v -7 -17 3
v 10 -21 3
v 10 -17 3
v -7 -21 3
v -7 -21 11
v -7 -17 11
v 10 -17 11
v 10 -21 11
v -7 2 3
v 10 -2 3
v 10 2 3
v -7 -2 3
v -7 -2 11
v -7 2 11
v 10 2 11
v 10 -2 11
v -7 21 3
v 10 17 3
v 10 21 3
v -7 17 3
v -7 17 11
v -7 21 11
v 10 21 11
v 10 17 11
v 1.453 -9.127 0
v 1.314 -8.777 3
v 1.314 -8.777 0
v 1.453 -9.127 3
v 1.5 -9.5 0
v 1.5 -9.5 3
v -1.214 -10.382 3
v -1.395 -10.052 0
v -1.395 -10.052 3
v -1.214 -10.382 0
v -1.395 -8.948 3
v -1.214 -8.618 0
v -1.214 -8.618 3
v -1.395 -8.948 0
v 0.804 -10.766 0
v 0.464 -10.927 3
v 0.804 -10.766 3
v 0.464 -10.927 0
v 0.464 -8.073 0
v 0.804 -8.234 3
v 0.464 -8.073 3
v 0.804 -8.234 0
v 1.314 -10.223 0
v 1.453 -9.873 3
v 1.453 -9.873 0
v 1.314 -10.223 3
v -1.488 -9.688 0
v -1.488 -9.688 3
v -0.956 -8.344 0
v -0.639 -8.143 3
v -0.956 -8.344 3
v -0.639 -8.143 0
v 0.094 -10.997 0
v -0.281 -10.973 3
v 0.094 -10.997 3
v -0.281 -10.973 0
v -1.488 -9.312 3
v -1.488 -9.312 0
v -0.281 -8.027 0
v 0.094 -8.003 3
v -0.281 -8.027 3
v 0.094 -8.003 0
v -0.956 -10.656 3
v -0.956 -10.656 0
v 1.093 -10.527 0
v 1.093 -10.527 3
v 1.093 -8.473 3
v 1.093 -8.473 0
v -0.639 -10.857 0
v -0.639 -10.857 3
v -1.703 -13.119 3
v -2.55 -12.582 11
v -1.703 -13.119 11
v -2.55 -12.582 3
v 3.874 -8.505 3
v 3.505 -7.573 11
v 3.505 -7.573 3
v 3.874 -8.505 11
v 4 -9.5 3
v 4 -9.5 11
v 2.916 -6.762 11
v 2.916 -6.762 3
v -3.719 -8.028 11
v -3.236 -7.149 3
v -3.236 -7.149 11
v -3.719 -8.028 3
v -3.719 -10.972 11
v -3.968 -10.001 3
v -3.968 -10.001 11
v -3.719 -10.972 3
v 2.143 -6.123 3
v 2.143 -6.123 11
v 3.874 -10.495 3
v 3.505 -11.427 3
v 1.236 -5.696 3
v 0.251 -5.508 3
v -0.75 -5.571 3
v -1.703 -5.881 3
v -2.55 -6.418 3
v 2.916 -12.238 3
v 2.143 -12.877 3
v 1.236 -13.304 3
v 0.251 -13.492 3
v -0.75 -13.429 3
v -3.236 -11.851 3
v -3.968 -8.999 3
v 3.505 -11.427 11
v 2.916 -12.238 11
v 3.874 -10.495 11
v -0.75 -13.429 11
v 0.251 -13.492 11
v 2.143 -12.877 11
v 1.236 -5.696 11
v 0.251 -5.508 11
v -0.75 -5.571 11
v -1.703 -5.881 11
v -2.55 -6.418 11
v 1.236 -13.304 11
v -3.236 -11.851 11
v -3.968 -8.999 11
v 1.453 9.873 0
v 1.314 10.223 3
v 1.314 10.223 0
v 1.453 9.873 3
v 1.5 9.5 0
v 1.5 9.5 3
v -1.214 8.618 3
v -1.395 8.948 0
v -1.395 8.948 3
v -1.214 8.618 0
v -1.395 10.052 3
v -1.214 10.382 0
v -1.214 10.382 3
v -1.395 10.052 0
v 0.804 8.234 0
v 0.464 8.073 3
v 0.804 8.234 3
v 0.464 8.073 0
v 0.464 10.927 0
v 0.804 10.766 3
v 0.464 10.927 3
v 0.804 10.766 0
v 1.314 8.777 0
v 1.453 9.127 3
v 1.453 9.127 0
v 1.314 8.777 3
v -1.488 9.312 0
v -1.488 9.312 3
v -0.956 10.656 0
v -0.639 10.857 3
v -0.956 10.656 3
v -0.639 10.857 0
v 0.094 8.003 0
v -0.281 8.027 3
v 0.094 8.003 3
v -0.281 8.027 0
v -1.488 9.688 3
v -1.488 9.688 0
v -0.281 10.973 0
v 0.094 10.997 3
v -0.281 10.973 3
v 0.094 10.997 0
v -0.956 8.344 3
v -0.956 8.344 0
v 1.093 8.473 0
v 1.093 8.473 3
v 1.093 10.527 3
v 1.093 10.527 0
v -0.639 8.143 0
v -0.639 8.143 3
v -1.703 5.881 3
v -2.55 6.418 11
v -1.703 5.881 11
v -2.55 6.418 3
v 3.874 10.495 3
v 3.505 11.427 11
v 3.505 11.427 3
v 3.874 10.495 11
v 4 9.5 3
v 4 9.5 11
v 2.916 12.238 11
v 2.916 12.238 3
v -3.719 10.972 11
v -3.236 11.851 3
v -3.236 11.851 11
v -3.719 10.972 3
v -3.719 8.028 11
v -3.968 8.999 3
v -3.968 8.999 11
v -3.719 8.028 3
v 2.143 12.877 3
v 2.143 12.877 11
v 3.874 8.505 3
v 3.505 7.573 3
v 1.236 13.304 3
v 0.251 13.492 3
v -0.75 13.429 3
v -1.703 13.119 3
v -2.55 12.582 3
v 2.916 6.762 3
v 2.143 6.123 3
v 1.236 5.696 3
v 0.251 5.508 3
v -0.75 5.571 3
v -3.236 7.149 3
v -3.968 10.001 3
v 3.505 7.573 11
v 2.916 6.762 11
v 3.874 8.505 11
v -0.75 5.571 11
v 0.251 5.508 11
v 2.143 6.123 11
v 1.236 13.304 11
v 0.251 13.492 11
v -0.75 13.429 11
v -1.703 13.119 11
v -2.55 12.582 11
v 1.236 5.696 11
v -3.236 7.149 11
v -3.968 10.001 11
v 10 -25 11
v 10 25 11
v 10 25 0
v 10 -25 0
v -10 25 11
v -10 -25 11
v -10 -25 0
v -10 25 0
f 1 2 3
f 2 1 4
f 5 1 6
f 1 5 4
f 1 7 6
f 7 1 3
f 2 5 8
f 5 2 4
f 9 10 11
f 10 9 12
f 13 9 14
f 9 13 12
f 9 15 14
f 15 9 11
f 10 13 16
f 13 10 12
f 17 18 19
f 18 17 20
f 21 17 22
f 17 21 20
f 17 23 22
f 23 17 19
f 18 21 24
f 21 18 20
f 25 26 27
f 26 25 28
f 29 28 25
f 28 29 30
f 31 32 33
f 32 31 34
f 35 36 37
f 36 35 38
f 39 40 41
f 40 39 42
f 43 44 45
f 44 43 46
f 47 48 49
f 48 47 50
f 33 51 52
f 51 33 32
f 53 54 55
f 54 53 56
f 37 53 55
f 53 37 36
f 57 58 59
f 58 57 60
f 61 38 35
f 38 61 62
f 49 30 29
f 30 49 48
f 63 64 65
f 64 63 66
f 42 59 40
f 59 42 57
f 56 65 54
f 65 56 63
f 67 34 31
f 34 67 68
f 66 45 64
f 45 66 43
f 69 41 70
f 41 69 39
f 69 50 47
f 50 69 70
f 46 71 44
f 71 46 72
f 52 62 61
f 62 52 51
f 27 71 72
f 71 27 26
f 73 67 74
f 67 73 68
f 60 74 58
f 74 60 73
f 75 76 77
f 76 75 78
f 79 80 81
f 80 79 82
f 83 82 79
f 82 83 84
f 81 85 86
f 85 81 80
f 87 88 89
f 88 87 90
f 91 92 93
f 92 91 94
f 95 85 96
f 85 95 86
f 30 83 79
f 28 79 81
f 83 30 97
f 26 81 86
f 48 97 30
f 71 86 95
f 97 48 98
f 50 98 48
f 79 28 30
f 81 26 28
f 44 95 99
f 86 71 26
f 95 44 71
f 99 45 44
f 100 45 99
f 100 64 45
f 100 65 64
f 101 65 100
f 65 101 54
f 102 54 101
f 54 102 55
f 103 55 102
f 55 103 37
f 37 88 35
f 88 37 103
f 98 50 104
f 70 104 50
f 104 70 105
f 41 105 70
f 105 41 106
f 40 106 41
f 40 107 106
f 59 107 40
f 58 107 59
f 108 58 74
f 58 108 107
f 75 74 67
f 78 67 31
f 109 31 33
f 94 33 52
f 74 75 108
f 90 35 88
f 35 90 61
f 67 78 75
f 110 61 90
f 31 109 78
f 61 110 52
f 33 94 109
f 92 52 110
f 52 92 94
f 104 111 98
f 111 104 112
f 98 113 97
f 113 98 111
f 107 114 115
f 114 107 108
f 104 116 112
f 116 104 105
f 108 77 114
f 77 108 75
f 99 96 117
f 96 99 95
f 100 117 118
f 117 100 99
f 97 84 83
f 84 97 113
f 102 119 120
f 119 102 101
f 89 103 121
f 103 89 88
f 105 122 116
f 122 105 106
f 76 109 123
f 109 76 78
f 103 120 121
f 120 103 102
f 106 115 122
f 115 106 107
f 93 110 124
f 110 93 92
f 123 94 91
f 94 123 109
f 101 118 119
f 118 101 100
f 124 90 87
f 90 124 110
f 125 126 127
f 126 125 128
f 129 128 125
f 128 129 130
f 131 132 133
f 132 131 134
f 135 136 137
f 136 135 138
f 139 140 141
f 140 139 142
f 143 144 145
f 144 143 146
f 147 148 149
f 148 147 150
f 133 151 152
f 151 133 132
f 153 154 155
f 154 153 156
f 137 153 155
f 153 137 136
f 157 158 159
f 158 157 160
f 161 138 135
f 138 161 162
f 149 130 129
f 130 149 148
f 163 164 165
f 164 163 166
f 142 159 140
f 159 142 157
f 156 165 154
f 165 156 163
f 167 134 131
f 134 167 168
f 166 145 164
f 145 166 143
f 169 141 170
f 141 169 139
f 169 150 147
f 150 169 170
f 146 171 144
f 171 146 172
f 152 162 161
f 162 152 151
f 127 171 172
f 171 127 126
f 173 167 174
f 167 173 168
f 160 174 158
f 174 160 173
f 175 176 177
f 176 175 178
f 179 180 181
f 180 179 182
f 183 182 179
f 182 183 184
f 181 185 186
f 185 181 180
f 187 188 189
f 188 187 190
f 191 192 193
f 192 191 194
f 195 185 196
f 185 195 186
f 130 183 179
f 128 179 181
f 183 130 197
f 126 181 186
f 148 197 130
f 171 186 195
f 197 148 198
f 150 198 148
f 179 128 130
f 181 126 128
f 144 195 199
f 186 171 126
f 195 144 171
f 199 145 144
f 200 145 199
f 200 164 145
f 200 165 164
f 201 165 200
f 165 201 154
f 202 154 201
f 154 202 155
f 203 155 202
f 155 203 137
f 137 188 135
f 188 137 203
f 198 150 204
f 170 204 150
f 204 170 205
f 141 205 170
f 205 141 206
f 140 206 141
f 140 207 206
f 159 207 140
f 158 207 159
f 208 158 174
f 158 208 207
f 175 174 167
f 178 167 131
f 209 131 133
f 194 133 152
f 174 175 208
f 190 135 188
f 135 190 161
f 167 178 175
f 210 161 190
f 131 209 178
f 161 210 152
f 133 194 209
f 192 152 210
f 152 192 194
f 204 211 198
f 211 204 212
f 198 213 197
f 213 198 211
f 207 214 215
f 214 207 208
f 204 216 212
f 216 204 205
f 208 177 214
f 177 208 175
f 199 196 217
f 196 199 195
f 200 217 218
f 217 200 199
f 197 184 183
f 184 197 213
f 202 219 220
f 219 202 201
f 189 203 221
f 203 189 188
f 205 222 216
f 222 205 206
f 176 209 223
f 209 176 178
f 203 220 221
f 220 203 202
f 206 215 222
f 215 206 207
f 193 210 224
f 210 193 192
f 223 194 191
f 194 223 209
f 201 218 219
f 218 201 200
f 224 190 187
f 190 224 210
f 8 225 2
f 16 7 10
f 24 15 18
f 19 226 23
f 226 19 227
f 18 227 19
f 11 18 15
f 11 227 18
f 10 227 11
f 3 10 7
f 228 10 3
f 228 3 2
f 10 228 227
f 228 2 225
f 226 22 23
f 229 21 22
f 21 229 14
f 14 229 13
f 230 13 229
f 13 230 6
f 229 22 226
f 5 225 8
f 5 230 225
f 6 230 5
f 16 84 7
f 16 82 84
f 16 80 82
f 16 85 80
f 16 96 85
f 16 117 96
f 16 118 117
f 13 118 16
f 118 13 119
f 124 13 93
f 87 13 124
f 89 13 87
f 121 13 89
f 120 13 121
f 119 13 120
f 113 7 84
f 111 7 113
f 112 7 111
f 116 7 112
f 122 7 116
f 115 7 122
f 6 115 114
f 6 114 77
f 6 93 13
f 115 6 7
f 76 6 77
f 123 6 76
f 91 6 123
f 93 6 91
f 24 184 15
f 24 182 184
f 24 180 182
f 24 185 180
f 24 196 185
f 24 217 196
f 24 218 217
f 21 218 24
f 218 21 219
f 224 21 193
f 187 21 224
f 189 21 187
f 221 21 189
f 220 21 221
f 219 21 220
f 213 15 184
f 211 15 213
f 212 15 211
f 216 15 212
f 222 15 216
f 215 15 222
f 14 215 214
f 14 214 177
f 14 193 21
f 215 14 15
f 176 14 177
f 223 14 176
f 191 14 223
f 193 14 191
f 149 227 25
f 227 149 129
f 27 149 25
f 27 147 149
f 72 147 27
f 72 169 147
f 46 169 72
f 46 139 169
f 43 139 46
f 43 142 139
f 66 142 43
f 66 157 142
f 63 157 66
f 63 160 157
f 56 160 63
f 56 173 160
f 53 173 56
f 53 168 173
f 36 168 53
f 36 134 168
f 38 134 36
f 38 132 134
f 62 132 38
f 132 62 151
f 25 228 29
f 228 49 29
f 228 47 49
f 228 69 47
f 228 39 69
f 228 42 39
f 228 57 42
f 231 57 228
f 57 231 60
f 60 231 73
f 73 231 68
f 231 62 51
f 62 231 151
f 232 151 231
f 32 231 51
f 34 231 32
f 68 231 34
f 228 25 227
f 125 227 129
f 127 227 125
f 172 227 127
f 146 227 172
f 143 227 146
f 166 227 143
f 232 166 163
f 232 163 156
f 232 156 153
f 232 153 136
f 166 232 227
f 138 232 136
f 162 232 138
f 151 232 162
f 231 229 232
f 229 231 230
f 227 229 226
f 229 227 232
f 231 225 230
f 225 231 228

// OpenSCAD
// Print bed glass holder
// (c) 2017 Michael Neuendorf <michael@neuendorf-online.de>

// The gap size in mm. Glass thickness plus convinient space
gap_size = 4;
// The space between slots in mm
void = 15;
// The number of slots
slot_count = 3;

// The width in mm
width = 20;

// Whether screw mounts should applied
screw_mounts = 1; // [0:No, 1:Yes]

/*[Hidden]*/
bottom_thickness = 3;
screw_dia = 3;
screw_driver_dia = 8;

height = gap_size * 2 + bottom_thickness;
length = (slot_count - 1) * void + (slot_count + 2) * gap_size;


holder();

module holder() {
    translate([-width / 2, -length / 2, 0])
    union() {
        difference() {
            cube([width, length, height]);
            
            for (y = [gap_size:void+gap_size:gap_size + (slot_count - 1) * (gap_size + void)]) {
                translate([bottom_thickness, y, bottom_thickness])
                cube([width - bottom_thickness + 0.1, gap_size, height - bottom_thickness + 0.1]);
            }
            
            if ((screw_mounts == 1) && (slot_count > 1)) {
                translate([width / 2, 2* gap_size + void / 2, 0])
                screw_hole();
                
                if (slot_count > 2) {
                    translate([width / 2, length - 2* gap_size - void / 2, 0])
                    screw_hole();
                }
            }
        }
        
        if ((screw_mounts == 1) && (slot_count ==1)) {
            translate([width / 2, 0, 0])
            rotate([0,0,90])
            outer_screw_mount();

            translate([width / 2, length, 0])
            rotate([0,0,-90])
            outer_screw_mount();
        }
    }
}

module outer_screw_mount() {
    difference() {
        union() {
            translate([-screw_driver_dia / 2, 0, 0])
            cylinder(d = screw_driver_dia, h = bottom_thickness, $fn=25);

            translate([-screw_driver_dia / 2, -screw_driver_dia / 2, 0])
            cube([screw_driver_dia / 2, screw_driver_dia, bottom_thickness]);
        }

        translate([-screw_driver_dia / 2, 0, -0.05])
        cylinder(d = screw_dia, h = bottom_thickness+0.1, $fn=25);
    }
    
}

module screw_hole() {
    union() {
        translate([0,0,-0.05])
        cylinder(d = screw_dia, h = bottom_thickness + 0.1, $fn=25);
        translate([0, 0, bottom_thickness])
        cylinder(d = screw_driver_dia, h = height - bottom_thickness + 0.1, $fn=25);
    }
}
